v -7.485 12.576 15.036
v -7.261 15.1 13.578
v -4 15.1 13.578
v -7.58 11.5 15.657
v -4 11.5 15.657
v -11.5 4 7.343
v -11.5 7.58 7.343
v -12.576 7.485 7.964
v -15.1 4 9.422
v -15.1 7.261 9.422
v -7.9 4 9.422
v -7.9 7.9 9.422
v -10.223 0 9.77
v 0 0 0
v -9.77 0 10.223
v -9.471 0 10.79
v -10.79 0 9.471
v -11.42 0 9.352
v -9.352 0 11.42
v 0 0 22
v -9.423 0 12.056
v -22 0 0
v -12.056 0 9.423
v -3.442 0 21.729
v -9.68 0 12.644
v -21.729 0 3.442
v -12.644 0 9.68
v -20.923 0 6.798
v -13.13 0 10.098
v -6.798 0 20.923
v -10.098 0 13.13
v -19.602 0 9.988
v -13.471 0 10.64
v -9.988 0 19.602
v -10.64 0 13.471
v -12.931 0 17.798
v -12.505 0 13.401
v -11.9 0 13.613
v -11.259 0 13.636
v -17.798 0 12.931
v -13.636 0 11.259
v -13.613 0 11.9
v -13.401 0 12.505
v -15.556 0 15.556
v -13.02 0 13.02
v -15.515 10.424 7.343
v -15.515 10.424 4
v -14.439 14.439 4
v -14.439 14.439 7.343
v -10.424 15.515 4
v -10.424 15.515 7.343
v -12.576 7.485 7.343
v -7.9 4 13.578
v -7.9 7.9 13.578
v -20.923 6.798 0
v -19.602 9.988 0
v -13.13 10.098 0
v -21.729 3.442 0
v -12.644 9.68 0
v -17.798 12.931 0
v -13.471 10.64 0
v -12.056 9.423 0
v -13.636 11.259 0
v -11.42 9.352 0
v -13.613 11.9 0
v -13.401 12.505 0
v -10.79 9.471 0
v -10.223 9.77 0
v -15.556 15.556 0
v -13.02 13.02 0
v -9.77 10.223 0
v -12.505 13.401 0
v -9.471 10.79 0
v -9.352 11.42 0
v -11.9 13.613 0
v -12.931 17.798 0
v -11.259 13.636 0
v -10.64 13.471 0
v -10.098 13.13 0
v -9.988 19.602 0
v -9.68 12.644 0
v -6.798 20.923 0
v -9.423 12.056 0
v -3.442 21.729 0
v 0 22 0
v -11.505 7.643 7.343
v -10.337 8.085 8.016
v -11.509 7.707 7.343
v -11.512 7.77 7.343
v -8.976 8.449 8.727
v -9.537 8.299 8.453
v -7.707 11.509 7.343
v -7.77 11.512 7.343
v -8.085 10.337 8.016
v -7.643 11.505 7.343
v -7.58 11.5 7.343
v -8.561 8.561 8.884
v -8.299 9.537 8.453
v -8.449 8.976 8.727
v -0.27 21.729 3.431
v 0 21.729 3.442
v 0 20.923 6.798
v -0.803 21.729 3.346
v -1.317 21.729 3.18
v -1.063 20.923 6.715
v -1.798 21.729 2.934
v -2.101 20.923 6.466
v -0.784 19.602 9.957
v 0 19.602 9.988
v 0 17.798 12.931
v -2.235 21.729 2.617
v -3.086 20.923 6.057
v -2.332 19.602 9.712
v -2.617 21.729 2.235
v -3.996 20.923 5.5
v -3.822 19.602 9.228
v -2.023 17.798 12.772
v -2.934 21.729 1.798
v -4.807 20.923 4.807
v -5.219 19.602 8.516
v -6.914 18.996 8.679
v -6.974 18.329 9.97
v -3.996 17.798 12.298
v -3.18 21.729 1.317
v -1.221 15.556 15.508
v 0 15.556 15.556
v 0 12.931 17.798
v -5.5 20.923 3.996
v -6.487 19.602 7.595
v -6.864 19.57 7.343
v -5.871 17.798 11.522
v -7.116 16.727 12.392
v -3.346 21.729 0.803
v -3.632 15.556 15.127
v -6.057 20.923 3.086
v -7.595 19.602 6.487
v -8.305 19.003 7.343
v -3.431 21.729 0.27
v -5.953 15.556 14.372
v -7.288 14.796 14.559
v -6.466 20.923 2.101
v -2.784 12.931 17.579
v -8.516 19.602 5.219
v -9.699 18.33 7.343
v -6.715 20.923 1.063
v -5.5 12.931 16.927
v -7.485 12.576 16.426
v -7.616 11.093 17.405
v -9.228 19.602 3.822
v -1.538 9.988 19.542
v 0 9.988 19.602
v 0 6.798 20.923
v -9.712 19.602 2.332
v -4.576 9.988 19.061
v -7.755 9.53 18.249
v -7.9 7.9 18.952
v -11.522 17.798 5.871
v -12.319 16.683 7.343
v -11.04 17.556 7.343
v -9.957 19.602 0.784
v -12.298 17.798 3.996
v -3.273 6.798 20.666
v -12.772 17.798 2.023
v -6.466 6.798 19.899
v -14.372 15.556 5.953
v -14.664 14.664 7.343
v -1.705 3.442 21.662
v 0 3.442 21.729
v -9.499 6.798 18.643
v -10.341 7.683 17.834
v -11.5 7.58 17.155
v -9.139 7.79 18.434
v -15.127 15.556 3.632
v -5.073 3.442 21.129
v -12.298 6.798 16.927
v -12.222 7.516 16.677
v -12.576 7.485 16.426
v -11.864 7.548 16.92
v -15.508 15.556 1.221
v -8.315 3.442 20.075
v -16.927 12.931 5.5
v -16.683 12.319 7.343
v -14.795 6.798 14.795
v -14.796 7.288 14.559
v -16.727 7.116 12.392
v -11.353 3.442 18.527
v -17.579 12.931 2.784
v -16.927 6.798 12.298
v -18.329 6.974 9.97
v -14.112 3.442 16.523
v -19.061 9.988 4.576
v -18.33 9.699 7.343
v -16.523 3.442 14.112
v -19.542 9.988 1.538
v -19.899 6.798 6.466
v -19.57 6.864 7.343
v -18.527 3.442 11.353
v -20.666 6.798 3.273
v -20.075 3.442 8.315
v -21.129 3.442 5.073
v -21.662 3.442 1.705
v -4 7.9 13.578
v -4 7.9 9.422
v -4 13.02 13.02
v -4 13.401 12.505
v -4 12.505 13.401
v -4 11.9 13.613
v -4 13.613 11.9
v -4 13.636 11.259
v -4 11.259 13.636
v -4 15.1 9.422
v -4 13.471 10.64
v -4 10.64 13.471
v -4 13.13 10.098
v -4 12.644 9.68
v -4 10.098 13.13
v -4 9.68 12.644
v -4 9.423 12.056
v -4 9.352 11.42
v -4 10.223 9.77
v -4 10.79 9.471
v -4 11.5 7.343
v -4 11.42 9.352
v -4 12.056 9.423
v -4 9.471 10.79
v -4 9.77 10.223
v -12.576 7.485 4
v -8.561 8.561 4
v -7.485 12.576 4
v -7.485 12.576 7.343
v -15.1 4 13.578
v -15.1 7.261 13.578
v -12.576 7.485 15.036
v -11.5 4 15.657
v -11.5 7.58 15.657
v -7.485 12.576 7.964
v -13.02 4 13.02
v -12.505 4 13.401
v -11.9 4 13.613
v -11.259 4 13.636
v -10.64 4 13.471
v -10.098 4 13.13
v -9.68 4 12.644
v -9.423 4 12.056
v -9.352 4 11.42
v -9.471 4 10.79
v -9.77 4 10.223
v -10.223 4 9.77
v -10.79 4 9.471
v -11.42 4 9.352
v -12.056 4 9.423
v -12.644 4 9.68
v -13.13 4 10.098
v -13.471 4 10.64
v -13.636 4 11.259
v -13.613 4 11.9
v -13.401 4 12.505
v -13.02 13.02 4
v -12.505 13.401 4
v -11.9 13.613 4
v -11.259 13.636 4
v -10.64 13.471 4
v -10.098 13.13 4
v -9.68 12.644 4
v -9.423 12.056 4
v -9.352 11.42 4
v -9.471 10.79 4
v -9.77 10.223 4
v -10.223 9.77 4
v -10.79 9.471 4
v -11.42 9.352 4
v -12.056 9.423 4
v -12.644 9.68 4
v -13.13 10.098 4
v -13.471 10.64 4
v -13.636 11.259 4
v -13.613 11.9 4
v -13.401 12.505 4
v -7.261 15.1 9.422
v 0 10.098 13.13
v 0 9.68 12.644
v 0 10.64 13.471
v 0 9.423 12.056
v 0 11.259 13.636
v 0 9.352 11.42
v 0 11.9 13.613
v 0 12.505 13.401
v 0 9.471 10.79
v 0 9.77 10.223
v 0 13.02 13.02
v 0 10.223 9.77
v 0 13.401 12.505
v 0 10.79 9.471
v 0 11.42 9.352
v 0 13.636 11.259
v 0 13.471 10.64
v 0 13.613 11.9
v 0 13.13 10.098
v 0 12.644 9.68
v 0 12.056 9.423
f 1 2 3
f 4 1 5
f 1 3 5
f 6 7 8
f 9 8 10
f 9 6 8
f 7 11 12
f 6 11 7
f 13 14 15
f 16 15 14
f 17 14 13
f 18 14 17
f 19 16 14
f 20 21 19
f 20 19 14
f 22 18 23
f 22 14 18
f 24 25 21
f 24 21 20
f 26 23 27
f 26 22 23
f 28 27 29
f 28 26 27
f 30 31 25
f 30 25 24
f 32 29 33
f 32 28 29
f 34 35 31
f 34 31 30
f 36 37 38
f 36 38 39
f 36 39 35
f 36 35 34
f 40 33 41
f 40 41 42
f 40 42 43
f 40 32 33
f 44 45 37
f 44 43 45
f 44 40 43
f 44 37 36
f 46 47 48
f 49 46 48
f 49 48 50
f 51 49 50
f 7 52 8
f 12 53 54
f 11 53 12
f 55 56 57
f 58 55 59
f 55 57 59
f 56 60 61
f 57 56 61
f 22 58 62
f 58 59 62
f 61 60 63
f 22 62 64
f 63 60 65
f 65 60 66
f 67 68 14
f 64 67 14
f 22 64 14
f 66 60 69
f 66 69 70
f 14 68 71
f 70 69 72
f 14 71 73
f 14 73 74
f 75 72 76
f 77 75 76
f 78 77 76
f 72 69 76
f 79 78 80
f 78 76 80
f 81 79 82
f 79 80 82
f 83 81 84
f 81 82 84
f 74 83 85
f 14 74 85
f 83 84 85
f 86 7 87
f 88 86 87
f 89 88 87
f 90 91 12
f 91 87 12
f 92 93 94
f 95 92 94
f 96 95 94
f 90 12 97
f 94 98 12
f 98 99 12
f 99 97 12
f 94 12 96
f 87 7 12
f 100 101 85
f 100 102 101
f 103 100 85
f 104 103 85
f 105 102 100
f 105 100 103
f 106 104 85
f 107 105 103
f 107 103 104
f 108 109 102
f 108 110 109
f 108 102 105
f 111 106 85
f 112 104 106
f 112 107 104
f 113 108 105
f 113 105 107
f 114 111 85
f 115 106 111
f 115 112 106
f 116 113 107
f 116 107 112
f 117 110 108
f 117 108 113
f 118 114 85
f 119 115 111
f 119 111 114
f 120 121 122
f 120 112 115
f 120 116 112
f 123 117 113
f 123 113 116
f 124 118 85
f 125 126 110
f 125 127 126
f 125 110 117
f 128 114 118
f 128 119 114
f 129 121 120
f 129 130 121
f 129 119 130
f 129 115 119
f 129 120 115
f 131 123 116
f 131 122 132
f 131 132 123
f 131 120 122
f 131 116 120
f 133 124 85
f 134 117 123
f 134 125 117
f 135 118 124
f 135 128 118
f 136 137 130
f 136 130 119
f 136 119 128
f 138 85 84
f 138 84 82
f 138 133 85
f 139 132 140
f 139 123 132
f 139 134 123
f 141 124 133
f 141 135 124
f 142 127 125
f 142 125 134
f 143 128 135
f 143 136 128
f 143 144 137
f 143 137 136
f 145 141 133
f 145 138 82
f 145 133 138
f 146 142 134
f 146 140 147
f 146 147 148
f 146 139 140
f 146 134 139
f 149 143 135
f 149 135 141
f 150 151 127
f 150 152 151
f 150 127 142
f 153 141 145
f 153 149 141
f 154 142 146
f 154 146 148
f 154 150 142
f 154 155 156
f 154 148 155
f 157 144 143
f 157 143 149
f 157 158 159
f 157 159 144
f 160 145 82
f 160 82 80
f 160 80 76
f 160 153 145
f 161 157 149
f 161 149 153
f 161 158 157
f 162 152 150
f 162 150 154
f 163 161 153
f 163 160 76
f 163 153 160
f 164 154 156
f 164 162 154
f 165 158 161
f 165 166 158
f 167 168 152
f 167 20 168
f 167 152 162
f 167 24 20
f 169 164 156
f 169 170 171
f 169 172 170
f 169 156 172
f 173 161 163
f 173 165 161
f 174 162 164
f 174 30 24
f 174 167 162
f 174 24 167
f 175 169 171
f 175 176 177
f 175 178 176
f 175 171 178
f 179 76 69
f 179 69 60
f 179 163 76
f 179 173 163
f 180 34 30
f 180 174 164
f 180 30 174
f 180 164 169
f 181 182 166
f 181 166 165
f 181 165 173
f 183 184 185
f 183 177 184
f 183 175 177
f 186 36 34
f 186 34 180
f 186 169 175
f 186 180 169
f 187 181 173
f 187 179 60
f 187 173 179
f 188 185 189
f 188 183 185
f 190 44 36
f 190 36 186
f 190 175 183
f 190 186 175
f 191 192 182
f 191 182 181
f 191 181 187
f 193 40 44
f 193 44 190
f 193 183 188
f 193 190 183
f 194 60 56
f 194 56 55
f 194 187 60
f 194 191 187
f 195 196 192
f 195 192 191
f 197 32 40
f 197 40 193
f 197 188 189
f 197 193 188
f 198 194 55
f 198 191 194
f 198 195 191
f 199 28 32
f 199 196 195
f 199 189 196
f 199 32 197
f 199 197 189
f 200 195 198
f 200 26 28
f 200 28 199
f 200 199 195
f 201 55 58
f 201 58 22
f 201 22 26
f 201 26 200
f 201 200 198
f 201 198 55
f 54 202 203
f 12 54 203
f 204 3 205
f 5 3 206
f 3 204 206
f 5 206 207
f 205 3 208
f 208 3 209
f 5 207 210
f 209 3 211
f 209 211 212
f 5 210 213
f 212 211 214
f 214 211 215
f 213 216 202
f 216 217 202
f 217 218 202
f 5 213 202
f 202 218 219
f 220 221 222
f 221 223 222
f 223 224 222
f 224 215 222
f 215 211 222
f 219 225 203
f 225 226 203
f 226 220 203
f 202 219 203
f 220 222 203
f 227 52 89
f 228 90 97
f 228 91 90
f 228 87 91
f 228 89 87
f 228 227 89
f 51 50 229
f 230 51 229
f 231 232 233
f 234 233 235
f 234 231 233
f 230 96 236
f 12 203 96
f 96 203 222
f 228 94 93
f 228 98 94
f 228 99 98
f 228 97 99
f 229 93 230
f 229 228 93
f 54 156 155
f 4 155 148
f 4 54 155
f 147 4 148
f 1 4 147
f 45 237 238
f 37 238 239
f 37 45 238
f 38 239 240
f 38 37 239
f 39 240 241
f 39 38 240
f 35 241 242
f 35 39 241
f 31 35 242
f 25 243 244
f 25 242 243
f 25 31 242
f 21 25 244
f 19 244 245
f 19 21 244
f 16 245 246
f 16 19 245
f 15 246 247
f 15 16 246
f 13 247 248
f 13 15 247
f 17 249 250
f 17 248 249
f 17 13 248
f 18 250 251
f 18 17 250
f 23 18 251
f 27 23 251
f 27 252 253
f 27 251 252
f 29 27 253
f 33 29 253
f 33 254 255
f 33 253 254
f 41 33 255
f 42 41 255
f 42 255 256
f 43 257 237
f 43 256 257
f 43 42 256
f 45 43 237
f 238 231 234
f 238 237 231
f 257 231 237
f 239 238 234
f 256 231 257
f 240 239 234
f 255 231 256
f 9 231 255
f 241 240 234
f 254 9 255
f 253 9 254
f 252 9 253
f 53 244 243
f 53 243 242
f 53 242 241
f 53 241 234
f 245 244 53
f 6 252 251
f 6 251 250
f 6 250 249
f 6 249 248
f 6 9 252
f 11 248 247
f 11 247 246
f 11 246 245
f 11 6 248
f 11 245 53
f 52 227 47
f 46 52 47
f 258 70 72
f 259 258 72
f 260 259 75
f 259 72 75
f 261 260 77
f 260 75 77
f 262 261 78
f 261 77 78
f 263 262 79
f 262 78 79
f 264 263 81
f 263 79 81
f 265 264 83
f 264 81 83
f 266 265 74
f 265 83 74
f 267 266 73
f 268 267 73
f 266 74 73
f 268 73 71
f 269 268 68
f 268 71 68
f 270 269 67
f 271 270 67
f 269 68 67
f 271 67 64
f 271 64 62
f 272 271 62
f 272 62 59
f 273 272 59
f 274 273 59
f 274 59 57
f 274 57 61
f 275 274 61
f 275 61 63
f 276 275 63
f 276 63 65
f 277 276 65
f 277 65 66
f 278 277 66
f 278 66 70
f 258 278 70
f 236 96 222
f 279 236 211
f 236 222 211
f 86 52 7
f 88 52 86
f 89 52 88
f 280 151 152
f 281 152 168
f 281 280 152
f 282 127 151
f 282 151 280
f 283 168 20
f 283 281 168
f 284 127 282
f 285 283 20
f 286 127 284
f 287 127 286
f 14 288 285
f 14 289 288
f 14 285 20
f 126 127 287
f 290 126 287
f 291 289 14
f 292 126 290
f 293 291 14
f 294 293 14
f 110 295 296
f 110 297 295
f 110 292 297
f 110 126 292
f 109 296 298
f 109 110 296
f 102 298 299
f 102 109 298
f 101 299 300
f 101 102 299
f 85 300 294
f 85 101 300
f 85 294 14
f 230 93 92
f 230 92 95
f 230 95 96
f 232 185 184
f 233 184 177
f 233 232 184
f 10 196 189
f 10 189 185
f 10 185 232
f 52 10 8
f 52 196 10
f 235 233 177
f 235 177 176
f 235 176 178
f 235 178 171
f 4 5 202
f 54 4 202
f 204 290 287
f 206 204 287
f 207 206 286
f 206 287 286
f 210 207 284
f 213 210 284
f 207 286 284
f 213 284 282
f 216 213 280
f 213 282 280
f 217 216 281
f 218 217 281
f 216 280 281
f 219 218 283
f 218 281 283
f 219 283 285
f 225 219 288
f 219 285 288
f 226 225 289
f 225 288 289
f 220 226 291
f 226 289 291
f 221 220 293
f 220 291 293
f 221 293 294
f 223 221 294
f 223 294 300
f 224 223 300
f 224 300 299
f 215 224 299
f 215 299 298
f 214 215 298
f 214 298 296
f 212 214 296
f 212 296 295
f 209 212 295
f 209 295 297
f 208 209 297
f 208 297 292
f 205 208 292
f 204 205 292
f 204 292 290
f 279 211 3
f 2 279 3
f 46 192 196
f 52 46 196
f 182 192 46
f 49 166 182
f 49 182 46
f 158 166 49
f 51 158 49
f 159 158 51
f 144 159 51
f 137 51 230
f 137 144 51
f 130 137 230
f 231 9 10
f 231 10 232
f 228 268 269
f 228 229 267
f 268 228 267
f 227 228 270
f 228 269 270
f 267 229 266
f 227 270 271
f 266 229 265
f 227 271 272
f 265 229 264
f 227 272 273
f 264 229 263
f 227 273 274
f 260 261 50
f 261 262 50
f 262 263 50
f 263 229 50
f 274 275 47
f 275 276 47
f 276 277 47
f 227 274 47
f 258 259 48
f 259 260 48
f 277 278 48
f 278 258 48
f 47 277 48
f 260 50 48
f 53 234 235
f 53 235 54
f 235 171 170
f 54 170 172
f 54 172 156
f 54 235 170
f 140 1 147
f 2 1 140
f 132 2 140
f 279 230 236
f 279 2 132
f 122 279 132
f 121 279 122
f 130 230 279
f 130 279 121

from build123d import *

# Parameters (mm, degrees)
REVOLVE1_ANGLE     = 90
SKETCH2_R          = 2.15
EXTRUDE1_DEPTH     = 39.105117767
EXTRUDE2_START     = 4
EXTRUDE2_DEPTH     = 35.105117767
EXTRUDE4_START     = -4
EXTRUDE4_DEPTH     = 35.105117767
CUT_REVOLVE1_START = 7.343078062
CUT_REVOLVE1_DEPTH = 11.608966683
EXTRUDE5_DEPTH     = 36.944401511


# Read off the part's stored shape, not the designer's step: Cut-Revolve1
with BuildPart() as part:
    # Sketch1 → Revolve1 (revolve)
    with BuildSketch(Plane(origin=(0, 0, 0), x_dir=(0, 0, -1), z_dir=(1, 0, 0))):
        with BuildLine():
            Line((0, 0), (0, 22))
            ThreePointArc((0, 22), (-15.556349186, 15.556349186), (-22, 0))
            Line((-22, 0), (0, 0))
        make_face()
    revolve(axis=Axis((0, 0, 0), (0, -1, 0)), revolution_arc=REVOLVE1_ANGLE)

    # Sketch2 → Extrude1 (cut, through all)
    with BuildSketch(Plane(origin=(0, 0, 0), x_dir=(1, 0, 0), z_dir=(0, 1, 0))):
        with Locations(Location((-11.5, -11.5, 0), (0, 0, 225))):
            Circle(SKETCH2_R)
    extrude1 = extrude(amount=EXTRUDE1_DEPTH, mode=Mode.SUBTRACT)

    # Sketch4 → Extrude2 (cut, through all)
    with BuildSketch(Plane(origin=(0, 0, 0), x_dir=(1, 0, 0), z_dir=(0, 1, 0)).offset(EXTRUDE2_START)):
        Polygon((-7.9, -9.421539031), (-11.5, -7.343078062), (-15.1, -9.421539031), (-15.1, -13.578460969), (-11.5, -15.656921938), (-7.9, -13.578460969), align=None)
    extrude2 = extrude(amount=EXTRUDE2_DEPTH, mode=Mode.SUBTRACT)

    # Mirror1: Extrude1 across plane
    add(extrude1.mirror(Plane(origin=(0, 0, 0), x_dir=(2.468850131082266e-15, 0.7071067811865478, 0.7071067811865472), z_dir=(2.4688501310822653e-15, 0.7071067811865475, -0.7071067811865477))), mode=Mode.SUBTRACT)

    # Mirror5: Extrude1, Extrude2 across plane
    add(extrude1.mirror(Plane(origin=(0, 0, 0), x_dir=(0, 0, 1), z_dir=(-0.7071067811865475, -0.7071067811865477, 0))), mode=Mode.SUBTRACT)
    add(extrude2.mirror(Plane(origin=(0, 0, 0), x_dir=(0, 0, 1), z_dir=(-0.7071067811865475, -0.7071067811865477, 0))), mode=Mode.SUBTRACT)

    # Sketch9 → Extrude4 (cut, through all)
    with BuildSketch(Plane(origin=(0, 0, 0), x_dir=(-1, 0, 0), z_dir=(0, 0, -1)).offset(EXTRUDE4_START)):
        Polygon((8.560612309, 8.560612309), (12.575890567, 7.484721742), (15.515278258, 10.424109433), (14.439387691, 14.439387691), (10.424109433, 15.515278258), (7.484721742, 12.575890567), align=None)
    extrude(amount=-EXTRUDE4_DEPTH, mode=Mode.SUBTRACT)

    # Cut-Revolve1 outline → Cut-Revolve1 (cut)
    with BuildSketch(Plane.XY.offset(CUT_REVOLVE1_START)):
        Polygon((-11.5, 7.58027444), (-7.9, 7.9), (-7.484721742, 12.575890567), (-8.560612309, 8.560612309), (-12.575890567, 7.484721742), align=None)
        Polygon((-7.484721742, 12.575890567), (-6.863589335, 19.569628152), (-6.736554213, 21), (-21, 21), (-21, 6.736554212), (-19.569628152, 6.863589334), (-12.575890567, 7.484721742), (-15.515278258, 10.424109433), (-14.439387691, 14.439387691), (-10.424109433, 15.515278258), align=None)
    extrude(amount=CUT_REVOLVE1_DEPTH, mode=Mode.SUBTRACT)

    # Sketch11 → Revolve4 (revolve)
    with BuildSketch(Plane(origin=(-0.757954206, 8.534304053, 0), x_dir=(0.9960793346659582, 0.08846445077782496, 0), z_dir=(-0.08846445077782496, 0.9960793346659582, 0))):
        Polygon((-7.170157583, -9.421539031), (-7.170157583, -7.343078062), (-10.784327534, -7.343078062), align=None)
    revolve(axis=Axis((-7.9, 7.9, 9.421539031), (0, 0, -1)))

    # Sketch12 → Extrude5 (cut, through all)
    with BuildSketch(Plane.XY.offset(4)):
        Polygon((-8.560612309, 8.560612309), (-7.484721742, 12.575890567), (-10.424109433, 15.515278258), (-14.439387691, 14.439387691), (-15.515278258, 10.424109433), (-12.575890567, 7.484721742), align=None)
    extrude(amount=EXTRUDE5_DEPTH, mode=Mode.SUBTRACT)


solid = part.part
